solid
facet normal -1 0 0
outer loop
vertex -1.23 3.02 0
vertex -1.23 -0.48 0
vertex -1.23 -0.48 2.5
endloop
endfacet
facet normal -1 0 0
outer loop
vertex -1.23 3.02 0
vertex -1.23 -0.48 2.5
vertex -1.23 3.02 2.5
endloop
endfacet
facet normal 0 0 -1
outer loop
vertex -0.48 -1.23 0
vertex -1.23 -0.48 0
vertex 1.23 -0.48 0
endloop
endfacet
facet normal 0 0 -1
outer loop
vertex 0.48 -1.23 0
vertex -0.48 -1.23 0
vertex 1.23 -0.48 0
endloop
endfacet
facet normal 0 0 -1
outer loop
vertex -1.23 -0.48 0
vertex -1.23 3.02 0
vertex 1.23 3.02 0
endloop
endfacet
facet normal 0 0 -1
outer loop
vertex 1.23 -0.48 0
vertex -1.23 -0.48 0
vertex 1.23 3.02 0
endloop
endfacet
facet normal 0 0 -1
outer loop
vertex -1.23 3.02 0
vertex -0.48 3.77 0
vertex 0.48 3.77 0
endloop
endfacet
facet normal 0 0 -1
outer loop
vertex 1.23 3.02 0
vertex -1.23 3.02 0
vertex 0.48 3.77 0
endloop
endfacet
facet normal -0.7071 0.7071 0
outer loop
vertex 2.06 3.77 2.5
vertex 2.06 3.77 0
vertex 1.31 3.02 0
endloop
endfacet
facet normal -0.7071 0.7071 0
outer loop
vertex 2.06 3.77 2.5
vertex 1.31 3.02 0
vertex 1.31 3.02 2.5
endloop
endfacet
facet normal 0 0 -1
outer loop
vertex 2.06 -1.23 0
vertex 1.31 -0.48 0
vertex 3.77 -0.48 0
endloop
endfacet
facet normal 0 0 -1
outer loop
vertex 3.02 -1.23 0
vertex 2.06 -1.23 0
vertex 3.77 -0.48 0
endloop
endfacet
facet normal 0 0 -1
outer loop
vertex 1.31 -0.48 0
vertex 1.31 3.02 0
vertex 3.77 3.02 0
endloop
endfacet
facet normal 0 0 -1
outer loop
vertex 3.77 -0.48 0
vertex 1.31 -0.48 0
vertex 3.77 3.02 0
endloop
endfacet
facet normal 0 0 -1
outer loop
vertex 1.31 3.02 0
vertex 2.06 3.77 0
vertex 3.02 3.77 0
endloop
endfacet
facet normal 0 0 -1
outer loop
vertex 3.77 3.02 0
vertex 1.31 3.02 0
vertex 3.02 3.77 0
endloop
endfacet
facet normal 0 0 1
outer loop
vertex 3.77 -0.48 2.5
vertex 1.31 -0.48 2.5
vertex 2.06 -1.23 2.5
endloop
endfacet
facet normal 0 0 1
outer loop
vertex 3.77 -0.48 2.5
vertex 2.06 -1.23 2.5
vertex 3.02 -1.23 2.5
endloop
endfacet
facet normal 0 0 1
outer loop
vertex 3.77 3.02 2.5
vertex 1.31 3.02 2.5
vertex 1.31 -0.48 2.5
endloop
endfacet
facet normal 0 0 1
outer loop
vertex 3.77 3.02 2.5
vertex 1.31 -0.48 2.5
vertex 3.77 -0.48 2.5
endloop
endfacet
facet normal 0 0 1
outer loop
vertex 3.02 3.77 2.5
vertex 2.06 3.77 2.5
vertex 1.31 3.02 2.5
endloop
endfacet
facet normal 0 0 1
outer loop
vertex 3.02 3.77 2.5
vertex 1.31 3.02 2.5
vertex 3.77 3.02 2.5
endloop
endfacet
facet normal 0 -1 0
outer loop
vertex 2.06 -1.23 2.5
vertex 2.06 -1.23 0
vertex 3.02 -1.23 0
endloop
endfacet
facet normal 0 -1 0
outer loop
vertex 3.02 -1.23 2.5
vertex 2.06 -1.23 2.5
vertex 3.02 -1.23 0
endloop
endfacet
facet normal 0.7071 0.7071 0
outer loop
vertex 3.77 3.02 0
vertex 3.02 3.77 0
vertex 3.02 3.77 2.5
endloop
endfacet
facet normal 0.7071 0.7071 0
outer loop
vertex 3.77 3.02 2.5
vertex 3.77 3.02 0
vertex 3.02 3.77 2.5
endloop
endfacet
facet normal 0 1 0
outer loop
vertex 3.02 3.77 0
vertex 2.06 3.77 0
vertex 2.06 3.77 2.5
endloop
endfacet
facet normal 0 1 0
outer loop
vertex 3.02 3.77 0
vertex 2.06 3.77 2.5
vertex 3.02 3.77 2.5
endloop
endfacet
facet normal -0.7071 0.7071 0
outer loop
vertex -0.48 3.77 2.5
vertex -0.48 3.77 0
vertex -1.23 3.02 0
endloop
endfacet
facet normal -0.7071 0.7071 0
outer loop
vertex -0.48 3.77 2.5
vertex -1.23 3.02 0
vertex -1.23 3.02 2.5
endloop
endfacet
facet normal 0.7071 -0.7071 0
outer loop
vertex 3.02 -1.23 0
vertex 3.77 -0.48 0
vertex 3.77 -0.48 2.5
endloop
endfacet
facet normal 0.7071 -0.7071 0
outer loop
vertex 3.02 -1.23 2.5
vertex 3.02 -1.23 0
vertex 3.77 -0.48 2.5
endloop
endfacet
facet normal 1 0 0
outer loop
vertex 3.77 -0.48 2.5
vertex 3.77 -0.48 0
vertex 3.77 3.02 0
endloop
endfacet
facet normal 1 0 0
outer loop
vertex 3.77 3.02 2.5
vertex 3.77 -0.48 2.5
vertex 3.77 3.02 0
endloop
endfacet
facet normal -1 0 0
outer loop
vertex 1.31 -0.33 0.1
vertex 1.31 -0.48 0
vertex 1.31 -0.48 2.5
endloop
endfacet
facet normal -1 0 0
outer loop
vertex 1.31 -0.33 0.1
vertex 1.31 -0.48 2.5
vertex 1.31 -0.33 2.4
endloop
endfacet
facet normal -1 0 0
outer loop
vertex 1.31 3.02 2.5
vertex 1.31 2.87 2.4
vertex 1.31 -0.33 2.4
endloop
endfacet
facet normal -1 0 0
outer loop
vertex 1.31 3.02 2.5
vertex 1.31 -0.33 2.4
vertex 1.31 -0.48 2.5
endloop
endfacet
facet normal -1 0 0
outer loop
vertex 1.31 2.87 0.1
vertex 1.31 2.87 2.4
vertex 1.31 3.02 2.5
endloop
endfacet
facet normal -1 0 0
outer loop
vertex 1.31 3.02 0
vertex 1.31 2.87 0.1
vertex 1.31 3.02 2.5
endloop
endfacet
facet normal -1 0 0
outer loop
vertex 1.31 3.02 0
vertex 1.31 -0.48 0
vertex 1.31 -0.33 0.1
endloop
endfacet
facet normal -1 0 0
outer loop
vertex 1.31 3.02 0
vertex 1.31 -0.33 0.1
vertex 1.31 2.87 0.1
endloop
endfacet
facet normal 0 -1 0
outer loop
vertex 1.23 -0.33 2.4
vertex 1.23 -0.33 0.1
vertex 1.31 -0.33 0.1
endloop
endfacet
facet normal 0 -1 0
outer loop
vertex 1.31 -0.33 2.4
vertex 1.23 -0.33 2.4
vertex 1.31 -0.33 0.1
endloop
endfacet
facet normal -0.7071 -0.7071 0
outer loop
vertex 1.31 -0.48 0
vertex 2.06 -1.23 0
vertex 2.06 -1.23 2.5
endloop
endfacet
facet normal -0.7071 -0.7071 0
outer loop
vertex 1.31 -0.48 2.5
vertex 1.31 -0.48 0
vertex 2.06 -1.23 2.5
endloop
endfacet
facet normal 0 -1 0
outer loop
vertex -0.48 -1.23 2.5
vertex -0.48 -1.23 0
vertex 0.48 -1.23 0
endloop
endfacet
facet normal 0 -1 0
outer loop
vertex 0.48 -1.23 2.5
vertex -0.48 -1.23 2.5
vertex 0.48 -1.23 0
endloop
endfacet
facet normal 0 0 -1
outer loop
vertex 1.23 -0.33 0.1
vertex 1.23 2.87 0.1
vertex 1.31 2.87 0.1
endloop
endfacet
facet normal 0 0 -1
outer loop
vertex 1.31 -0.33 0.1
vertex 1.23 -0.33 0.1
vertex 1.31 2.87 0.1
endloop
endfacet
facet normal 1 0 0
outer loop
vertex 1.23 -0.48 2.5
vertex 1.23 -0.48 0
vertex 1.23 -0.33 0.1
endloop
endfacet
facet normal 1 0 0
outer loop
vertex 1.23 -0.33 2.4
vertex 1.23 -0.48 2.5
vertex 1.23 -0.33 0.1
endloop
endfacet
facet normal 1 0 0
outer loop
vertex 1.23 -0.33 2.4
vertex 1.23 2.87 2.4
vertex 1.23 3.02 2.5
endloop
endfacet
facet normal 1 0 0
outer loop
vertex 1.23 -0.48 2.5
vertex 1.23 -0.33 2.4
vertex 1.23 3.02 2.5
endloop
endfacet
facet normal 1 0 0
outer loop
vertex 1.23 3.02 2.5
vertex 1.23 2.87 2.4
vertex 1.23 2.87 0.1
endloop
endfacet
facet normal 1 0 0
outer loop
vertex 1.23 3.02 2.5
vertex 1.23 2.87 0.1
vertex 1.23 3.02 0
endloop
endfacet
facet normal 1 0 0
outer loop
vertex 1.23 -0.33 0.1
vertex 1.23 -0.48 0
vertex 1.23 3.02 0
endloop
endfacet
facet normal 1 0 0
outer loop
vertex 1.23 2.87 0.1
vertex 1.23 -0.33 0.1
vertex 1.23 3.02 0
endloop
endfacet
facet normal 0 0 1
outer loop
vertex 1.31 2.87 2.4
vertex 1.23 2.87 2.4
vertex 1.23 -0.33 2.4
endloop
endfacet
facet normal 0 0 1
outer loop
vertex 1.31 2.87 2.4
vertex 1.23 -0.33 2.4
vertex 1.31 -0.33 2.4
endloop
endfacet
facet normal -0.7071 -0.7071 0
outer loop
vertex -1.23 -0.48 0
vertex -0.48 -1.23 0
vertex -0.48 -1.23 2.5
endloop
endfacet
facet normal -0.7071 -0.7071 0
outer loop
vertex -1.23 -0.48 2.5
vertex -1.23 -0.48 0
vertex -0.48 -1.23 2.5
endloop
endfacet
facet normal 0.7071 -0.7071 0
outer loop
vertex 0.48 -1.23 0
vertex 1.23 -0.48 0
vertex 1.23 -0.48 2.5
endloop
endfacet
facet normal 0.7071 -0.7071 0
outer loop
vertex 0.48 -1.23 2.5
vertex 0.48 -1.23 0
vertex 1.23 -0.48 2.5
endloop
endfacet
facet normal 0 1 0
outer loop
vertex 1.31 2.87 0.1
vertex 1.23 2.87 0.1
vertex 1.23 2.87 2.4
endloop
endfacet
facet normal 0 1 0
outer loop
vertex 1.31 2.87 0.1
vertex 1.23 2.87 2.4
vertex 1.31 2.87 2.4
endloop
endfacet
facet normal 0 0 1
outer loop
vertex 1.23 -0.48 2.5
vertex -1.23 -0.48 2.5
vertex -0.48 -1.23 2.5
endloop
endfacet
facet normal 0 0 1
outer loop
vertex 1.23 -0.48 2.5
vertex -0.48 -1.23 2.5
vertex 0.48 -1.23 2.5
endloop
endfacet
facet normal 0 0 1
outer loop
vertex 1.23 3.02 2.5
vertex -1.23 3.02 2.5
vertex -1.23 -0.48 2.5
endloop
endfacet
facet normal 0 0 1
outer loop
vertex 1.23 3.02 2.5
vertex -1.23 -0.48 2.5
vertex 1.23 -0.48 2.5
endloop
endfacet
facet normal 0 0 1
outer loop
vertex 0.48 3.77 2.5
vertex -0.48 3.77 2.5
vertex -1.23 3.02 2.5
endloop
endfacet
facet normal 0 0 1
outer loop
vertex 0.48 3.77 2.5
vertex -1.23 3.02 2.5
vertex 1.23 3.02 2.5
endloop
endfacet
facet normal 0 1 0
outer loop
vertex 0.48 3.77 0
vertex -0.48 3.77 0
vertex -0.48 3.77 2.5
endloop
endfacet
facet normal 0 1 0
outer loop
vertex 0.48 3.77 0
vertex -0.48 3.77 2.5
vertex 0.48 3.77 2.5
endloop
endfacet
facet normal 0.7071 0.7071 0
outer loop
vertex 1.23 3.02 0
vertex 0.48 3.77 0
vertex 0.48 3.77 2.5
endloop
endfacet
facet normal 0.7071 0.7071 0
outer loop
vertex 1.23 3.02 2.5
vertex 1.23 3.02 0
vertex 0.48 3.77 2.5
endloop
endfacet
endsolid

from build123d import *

# Parameters (mm, degrees)
BOX025_W         = 2.54
BOX025_H         = 3.2
BOX025_DEPTH     = 2.3
BOX023_W         = 2.46
BOX023_H         = 5
BOX023_DEPTH     = 2.5
CHAMFER004_SIZE  = 0.75
ARRAY010_X_COUNT = 2
ARRAY010_X_PITCH = 2.54


with BuildPart() as cube001:
    # Box025 → Box025 (new body)
    with BuildSketch(Plane(origin=(0, -0.33, 0.1), x_dir=(1, 0, 0), z_dir=(0, 0, 1))):
        with Locations((1.27, 1.6)):
            Rectangle(BOX025_W, BOX025_H)
    extrude(amount=BOX025_DEPTH)


with BuildPart() as body:
    # Box023 → Box023 (new body)
    with BuildSketch(Plane(origin=(-1.23, -1.23, 0), x_dir=(1, 0, 0), z_dir=(0, 0, 1))):
        with Locations((1.23, 2.5)):
            Rectangle(BOX023_W, BOX023_H)
    extrude(amount=BOX023_DEPTH)

    # Chamfer004
    chamfer004_edges = [body.edges().sort_by_distance(p)[0] for p in [
        (-1.23, -1.23, 1.25),
        (-1.23, 3.77, 1.25),
        (1.23, -1.23, 1.25),
        (1.23, 3.77, 1.25),
    ]]
    chamfer(chamfer004_edges, length=CHAMFER004_SIZE)

    # Array010 X: Body ×2


with BuildPart() as body_1:
    add(body.part)
    with Locations(*[(i * ARRAY010_X_PITCH, 0, 0) for i in range(1, ARRAY010_X_COUNT)]):
        add(body.part)

    # Fusion021: union Cube001
    add(cube001.part)


solid = body_1.part
